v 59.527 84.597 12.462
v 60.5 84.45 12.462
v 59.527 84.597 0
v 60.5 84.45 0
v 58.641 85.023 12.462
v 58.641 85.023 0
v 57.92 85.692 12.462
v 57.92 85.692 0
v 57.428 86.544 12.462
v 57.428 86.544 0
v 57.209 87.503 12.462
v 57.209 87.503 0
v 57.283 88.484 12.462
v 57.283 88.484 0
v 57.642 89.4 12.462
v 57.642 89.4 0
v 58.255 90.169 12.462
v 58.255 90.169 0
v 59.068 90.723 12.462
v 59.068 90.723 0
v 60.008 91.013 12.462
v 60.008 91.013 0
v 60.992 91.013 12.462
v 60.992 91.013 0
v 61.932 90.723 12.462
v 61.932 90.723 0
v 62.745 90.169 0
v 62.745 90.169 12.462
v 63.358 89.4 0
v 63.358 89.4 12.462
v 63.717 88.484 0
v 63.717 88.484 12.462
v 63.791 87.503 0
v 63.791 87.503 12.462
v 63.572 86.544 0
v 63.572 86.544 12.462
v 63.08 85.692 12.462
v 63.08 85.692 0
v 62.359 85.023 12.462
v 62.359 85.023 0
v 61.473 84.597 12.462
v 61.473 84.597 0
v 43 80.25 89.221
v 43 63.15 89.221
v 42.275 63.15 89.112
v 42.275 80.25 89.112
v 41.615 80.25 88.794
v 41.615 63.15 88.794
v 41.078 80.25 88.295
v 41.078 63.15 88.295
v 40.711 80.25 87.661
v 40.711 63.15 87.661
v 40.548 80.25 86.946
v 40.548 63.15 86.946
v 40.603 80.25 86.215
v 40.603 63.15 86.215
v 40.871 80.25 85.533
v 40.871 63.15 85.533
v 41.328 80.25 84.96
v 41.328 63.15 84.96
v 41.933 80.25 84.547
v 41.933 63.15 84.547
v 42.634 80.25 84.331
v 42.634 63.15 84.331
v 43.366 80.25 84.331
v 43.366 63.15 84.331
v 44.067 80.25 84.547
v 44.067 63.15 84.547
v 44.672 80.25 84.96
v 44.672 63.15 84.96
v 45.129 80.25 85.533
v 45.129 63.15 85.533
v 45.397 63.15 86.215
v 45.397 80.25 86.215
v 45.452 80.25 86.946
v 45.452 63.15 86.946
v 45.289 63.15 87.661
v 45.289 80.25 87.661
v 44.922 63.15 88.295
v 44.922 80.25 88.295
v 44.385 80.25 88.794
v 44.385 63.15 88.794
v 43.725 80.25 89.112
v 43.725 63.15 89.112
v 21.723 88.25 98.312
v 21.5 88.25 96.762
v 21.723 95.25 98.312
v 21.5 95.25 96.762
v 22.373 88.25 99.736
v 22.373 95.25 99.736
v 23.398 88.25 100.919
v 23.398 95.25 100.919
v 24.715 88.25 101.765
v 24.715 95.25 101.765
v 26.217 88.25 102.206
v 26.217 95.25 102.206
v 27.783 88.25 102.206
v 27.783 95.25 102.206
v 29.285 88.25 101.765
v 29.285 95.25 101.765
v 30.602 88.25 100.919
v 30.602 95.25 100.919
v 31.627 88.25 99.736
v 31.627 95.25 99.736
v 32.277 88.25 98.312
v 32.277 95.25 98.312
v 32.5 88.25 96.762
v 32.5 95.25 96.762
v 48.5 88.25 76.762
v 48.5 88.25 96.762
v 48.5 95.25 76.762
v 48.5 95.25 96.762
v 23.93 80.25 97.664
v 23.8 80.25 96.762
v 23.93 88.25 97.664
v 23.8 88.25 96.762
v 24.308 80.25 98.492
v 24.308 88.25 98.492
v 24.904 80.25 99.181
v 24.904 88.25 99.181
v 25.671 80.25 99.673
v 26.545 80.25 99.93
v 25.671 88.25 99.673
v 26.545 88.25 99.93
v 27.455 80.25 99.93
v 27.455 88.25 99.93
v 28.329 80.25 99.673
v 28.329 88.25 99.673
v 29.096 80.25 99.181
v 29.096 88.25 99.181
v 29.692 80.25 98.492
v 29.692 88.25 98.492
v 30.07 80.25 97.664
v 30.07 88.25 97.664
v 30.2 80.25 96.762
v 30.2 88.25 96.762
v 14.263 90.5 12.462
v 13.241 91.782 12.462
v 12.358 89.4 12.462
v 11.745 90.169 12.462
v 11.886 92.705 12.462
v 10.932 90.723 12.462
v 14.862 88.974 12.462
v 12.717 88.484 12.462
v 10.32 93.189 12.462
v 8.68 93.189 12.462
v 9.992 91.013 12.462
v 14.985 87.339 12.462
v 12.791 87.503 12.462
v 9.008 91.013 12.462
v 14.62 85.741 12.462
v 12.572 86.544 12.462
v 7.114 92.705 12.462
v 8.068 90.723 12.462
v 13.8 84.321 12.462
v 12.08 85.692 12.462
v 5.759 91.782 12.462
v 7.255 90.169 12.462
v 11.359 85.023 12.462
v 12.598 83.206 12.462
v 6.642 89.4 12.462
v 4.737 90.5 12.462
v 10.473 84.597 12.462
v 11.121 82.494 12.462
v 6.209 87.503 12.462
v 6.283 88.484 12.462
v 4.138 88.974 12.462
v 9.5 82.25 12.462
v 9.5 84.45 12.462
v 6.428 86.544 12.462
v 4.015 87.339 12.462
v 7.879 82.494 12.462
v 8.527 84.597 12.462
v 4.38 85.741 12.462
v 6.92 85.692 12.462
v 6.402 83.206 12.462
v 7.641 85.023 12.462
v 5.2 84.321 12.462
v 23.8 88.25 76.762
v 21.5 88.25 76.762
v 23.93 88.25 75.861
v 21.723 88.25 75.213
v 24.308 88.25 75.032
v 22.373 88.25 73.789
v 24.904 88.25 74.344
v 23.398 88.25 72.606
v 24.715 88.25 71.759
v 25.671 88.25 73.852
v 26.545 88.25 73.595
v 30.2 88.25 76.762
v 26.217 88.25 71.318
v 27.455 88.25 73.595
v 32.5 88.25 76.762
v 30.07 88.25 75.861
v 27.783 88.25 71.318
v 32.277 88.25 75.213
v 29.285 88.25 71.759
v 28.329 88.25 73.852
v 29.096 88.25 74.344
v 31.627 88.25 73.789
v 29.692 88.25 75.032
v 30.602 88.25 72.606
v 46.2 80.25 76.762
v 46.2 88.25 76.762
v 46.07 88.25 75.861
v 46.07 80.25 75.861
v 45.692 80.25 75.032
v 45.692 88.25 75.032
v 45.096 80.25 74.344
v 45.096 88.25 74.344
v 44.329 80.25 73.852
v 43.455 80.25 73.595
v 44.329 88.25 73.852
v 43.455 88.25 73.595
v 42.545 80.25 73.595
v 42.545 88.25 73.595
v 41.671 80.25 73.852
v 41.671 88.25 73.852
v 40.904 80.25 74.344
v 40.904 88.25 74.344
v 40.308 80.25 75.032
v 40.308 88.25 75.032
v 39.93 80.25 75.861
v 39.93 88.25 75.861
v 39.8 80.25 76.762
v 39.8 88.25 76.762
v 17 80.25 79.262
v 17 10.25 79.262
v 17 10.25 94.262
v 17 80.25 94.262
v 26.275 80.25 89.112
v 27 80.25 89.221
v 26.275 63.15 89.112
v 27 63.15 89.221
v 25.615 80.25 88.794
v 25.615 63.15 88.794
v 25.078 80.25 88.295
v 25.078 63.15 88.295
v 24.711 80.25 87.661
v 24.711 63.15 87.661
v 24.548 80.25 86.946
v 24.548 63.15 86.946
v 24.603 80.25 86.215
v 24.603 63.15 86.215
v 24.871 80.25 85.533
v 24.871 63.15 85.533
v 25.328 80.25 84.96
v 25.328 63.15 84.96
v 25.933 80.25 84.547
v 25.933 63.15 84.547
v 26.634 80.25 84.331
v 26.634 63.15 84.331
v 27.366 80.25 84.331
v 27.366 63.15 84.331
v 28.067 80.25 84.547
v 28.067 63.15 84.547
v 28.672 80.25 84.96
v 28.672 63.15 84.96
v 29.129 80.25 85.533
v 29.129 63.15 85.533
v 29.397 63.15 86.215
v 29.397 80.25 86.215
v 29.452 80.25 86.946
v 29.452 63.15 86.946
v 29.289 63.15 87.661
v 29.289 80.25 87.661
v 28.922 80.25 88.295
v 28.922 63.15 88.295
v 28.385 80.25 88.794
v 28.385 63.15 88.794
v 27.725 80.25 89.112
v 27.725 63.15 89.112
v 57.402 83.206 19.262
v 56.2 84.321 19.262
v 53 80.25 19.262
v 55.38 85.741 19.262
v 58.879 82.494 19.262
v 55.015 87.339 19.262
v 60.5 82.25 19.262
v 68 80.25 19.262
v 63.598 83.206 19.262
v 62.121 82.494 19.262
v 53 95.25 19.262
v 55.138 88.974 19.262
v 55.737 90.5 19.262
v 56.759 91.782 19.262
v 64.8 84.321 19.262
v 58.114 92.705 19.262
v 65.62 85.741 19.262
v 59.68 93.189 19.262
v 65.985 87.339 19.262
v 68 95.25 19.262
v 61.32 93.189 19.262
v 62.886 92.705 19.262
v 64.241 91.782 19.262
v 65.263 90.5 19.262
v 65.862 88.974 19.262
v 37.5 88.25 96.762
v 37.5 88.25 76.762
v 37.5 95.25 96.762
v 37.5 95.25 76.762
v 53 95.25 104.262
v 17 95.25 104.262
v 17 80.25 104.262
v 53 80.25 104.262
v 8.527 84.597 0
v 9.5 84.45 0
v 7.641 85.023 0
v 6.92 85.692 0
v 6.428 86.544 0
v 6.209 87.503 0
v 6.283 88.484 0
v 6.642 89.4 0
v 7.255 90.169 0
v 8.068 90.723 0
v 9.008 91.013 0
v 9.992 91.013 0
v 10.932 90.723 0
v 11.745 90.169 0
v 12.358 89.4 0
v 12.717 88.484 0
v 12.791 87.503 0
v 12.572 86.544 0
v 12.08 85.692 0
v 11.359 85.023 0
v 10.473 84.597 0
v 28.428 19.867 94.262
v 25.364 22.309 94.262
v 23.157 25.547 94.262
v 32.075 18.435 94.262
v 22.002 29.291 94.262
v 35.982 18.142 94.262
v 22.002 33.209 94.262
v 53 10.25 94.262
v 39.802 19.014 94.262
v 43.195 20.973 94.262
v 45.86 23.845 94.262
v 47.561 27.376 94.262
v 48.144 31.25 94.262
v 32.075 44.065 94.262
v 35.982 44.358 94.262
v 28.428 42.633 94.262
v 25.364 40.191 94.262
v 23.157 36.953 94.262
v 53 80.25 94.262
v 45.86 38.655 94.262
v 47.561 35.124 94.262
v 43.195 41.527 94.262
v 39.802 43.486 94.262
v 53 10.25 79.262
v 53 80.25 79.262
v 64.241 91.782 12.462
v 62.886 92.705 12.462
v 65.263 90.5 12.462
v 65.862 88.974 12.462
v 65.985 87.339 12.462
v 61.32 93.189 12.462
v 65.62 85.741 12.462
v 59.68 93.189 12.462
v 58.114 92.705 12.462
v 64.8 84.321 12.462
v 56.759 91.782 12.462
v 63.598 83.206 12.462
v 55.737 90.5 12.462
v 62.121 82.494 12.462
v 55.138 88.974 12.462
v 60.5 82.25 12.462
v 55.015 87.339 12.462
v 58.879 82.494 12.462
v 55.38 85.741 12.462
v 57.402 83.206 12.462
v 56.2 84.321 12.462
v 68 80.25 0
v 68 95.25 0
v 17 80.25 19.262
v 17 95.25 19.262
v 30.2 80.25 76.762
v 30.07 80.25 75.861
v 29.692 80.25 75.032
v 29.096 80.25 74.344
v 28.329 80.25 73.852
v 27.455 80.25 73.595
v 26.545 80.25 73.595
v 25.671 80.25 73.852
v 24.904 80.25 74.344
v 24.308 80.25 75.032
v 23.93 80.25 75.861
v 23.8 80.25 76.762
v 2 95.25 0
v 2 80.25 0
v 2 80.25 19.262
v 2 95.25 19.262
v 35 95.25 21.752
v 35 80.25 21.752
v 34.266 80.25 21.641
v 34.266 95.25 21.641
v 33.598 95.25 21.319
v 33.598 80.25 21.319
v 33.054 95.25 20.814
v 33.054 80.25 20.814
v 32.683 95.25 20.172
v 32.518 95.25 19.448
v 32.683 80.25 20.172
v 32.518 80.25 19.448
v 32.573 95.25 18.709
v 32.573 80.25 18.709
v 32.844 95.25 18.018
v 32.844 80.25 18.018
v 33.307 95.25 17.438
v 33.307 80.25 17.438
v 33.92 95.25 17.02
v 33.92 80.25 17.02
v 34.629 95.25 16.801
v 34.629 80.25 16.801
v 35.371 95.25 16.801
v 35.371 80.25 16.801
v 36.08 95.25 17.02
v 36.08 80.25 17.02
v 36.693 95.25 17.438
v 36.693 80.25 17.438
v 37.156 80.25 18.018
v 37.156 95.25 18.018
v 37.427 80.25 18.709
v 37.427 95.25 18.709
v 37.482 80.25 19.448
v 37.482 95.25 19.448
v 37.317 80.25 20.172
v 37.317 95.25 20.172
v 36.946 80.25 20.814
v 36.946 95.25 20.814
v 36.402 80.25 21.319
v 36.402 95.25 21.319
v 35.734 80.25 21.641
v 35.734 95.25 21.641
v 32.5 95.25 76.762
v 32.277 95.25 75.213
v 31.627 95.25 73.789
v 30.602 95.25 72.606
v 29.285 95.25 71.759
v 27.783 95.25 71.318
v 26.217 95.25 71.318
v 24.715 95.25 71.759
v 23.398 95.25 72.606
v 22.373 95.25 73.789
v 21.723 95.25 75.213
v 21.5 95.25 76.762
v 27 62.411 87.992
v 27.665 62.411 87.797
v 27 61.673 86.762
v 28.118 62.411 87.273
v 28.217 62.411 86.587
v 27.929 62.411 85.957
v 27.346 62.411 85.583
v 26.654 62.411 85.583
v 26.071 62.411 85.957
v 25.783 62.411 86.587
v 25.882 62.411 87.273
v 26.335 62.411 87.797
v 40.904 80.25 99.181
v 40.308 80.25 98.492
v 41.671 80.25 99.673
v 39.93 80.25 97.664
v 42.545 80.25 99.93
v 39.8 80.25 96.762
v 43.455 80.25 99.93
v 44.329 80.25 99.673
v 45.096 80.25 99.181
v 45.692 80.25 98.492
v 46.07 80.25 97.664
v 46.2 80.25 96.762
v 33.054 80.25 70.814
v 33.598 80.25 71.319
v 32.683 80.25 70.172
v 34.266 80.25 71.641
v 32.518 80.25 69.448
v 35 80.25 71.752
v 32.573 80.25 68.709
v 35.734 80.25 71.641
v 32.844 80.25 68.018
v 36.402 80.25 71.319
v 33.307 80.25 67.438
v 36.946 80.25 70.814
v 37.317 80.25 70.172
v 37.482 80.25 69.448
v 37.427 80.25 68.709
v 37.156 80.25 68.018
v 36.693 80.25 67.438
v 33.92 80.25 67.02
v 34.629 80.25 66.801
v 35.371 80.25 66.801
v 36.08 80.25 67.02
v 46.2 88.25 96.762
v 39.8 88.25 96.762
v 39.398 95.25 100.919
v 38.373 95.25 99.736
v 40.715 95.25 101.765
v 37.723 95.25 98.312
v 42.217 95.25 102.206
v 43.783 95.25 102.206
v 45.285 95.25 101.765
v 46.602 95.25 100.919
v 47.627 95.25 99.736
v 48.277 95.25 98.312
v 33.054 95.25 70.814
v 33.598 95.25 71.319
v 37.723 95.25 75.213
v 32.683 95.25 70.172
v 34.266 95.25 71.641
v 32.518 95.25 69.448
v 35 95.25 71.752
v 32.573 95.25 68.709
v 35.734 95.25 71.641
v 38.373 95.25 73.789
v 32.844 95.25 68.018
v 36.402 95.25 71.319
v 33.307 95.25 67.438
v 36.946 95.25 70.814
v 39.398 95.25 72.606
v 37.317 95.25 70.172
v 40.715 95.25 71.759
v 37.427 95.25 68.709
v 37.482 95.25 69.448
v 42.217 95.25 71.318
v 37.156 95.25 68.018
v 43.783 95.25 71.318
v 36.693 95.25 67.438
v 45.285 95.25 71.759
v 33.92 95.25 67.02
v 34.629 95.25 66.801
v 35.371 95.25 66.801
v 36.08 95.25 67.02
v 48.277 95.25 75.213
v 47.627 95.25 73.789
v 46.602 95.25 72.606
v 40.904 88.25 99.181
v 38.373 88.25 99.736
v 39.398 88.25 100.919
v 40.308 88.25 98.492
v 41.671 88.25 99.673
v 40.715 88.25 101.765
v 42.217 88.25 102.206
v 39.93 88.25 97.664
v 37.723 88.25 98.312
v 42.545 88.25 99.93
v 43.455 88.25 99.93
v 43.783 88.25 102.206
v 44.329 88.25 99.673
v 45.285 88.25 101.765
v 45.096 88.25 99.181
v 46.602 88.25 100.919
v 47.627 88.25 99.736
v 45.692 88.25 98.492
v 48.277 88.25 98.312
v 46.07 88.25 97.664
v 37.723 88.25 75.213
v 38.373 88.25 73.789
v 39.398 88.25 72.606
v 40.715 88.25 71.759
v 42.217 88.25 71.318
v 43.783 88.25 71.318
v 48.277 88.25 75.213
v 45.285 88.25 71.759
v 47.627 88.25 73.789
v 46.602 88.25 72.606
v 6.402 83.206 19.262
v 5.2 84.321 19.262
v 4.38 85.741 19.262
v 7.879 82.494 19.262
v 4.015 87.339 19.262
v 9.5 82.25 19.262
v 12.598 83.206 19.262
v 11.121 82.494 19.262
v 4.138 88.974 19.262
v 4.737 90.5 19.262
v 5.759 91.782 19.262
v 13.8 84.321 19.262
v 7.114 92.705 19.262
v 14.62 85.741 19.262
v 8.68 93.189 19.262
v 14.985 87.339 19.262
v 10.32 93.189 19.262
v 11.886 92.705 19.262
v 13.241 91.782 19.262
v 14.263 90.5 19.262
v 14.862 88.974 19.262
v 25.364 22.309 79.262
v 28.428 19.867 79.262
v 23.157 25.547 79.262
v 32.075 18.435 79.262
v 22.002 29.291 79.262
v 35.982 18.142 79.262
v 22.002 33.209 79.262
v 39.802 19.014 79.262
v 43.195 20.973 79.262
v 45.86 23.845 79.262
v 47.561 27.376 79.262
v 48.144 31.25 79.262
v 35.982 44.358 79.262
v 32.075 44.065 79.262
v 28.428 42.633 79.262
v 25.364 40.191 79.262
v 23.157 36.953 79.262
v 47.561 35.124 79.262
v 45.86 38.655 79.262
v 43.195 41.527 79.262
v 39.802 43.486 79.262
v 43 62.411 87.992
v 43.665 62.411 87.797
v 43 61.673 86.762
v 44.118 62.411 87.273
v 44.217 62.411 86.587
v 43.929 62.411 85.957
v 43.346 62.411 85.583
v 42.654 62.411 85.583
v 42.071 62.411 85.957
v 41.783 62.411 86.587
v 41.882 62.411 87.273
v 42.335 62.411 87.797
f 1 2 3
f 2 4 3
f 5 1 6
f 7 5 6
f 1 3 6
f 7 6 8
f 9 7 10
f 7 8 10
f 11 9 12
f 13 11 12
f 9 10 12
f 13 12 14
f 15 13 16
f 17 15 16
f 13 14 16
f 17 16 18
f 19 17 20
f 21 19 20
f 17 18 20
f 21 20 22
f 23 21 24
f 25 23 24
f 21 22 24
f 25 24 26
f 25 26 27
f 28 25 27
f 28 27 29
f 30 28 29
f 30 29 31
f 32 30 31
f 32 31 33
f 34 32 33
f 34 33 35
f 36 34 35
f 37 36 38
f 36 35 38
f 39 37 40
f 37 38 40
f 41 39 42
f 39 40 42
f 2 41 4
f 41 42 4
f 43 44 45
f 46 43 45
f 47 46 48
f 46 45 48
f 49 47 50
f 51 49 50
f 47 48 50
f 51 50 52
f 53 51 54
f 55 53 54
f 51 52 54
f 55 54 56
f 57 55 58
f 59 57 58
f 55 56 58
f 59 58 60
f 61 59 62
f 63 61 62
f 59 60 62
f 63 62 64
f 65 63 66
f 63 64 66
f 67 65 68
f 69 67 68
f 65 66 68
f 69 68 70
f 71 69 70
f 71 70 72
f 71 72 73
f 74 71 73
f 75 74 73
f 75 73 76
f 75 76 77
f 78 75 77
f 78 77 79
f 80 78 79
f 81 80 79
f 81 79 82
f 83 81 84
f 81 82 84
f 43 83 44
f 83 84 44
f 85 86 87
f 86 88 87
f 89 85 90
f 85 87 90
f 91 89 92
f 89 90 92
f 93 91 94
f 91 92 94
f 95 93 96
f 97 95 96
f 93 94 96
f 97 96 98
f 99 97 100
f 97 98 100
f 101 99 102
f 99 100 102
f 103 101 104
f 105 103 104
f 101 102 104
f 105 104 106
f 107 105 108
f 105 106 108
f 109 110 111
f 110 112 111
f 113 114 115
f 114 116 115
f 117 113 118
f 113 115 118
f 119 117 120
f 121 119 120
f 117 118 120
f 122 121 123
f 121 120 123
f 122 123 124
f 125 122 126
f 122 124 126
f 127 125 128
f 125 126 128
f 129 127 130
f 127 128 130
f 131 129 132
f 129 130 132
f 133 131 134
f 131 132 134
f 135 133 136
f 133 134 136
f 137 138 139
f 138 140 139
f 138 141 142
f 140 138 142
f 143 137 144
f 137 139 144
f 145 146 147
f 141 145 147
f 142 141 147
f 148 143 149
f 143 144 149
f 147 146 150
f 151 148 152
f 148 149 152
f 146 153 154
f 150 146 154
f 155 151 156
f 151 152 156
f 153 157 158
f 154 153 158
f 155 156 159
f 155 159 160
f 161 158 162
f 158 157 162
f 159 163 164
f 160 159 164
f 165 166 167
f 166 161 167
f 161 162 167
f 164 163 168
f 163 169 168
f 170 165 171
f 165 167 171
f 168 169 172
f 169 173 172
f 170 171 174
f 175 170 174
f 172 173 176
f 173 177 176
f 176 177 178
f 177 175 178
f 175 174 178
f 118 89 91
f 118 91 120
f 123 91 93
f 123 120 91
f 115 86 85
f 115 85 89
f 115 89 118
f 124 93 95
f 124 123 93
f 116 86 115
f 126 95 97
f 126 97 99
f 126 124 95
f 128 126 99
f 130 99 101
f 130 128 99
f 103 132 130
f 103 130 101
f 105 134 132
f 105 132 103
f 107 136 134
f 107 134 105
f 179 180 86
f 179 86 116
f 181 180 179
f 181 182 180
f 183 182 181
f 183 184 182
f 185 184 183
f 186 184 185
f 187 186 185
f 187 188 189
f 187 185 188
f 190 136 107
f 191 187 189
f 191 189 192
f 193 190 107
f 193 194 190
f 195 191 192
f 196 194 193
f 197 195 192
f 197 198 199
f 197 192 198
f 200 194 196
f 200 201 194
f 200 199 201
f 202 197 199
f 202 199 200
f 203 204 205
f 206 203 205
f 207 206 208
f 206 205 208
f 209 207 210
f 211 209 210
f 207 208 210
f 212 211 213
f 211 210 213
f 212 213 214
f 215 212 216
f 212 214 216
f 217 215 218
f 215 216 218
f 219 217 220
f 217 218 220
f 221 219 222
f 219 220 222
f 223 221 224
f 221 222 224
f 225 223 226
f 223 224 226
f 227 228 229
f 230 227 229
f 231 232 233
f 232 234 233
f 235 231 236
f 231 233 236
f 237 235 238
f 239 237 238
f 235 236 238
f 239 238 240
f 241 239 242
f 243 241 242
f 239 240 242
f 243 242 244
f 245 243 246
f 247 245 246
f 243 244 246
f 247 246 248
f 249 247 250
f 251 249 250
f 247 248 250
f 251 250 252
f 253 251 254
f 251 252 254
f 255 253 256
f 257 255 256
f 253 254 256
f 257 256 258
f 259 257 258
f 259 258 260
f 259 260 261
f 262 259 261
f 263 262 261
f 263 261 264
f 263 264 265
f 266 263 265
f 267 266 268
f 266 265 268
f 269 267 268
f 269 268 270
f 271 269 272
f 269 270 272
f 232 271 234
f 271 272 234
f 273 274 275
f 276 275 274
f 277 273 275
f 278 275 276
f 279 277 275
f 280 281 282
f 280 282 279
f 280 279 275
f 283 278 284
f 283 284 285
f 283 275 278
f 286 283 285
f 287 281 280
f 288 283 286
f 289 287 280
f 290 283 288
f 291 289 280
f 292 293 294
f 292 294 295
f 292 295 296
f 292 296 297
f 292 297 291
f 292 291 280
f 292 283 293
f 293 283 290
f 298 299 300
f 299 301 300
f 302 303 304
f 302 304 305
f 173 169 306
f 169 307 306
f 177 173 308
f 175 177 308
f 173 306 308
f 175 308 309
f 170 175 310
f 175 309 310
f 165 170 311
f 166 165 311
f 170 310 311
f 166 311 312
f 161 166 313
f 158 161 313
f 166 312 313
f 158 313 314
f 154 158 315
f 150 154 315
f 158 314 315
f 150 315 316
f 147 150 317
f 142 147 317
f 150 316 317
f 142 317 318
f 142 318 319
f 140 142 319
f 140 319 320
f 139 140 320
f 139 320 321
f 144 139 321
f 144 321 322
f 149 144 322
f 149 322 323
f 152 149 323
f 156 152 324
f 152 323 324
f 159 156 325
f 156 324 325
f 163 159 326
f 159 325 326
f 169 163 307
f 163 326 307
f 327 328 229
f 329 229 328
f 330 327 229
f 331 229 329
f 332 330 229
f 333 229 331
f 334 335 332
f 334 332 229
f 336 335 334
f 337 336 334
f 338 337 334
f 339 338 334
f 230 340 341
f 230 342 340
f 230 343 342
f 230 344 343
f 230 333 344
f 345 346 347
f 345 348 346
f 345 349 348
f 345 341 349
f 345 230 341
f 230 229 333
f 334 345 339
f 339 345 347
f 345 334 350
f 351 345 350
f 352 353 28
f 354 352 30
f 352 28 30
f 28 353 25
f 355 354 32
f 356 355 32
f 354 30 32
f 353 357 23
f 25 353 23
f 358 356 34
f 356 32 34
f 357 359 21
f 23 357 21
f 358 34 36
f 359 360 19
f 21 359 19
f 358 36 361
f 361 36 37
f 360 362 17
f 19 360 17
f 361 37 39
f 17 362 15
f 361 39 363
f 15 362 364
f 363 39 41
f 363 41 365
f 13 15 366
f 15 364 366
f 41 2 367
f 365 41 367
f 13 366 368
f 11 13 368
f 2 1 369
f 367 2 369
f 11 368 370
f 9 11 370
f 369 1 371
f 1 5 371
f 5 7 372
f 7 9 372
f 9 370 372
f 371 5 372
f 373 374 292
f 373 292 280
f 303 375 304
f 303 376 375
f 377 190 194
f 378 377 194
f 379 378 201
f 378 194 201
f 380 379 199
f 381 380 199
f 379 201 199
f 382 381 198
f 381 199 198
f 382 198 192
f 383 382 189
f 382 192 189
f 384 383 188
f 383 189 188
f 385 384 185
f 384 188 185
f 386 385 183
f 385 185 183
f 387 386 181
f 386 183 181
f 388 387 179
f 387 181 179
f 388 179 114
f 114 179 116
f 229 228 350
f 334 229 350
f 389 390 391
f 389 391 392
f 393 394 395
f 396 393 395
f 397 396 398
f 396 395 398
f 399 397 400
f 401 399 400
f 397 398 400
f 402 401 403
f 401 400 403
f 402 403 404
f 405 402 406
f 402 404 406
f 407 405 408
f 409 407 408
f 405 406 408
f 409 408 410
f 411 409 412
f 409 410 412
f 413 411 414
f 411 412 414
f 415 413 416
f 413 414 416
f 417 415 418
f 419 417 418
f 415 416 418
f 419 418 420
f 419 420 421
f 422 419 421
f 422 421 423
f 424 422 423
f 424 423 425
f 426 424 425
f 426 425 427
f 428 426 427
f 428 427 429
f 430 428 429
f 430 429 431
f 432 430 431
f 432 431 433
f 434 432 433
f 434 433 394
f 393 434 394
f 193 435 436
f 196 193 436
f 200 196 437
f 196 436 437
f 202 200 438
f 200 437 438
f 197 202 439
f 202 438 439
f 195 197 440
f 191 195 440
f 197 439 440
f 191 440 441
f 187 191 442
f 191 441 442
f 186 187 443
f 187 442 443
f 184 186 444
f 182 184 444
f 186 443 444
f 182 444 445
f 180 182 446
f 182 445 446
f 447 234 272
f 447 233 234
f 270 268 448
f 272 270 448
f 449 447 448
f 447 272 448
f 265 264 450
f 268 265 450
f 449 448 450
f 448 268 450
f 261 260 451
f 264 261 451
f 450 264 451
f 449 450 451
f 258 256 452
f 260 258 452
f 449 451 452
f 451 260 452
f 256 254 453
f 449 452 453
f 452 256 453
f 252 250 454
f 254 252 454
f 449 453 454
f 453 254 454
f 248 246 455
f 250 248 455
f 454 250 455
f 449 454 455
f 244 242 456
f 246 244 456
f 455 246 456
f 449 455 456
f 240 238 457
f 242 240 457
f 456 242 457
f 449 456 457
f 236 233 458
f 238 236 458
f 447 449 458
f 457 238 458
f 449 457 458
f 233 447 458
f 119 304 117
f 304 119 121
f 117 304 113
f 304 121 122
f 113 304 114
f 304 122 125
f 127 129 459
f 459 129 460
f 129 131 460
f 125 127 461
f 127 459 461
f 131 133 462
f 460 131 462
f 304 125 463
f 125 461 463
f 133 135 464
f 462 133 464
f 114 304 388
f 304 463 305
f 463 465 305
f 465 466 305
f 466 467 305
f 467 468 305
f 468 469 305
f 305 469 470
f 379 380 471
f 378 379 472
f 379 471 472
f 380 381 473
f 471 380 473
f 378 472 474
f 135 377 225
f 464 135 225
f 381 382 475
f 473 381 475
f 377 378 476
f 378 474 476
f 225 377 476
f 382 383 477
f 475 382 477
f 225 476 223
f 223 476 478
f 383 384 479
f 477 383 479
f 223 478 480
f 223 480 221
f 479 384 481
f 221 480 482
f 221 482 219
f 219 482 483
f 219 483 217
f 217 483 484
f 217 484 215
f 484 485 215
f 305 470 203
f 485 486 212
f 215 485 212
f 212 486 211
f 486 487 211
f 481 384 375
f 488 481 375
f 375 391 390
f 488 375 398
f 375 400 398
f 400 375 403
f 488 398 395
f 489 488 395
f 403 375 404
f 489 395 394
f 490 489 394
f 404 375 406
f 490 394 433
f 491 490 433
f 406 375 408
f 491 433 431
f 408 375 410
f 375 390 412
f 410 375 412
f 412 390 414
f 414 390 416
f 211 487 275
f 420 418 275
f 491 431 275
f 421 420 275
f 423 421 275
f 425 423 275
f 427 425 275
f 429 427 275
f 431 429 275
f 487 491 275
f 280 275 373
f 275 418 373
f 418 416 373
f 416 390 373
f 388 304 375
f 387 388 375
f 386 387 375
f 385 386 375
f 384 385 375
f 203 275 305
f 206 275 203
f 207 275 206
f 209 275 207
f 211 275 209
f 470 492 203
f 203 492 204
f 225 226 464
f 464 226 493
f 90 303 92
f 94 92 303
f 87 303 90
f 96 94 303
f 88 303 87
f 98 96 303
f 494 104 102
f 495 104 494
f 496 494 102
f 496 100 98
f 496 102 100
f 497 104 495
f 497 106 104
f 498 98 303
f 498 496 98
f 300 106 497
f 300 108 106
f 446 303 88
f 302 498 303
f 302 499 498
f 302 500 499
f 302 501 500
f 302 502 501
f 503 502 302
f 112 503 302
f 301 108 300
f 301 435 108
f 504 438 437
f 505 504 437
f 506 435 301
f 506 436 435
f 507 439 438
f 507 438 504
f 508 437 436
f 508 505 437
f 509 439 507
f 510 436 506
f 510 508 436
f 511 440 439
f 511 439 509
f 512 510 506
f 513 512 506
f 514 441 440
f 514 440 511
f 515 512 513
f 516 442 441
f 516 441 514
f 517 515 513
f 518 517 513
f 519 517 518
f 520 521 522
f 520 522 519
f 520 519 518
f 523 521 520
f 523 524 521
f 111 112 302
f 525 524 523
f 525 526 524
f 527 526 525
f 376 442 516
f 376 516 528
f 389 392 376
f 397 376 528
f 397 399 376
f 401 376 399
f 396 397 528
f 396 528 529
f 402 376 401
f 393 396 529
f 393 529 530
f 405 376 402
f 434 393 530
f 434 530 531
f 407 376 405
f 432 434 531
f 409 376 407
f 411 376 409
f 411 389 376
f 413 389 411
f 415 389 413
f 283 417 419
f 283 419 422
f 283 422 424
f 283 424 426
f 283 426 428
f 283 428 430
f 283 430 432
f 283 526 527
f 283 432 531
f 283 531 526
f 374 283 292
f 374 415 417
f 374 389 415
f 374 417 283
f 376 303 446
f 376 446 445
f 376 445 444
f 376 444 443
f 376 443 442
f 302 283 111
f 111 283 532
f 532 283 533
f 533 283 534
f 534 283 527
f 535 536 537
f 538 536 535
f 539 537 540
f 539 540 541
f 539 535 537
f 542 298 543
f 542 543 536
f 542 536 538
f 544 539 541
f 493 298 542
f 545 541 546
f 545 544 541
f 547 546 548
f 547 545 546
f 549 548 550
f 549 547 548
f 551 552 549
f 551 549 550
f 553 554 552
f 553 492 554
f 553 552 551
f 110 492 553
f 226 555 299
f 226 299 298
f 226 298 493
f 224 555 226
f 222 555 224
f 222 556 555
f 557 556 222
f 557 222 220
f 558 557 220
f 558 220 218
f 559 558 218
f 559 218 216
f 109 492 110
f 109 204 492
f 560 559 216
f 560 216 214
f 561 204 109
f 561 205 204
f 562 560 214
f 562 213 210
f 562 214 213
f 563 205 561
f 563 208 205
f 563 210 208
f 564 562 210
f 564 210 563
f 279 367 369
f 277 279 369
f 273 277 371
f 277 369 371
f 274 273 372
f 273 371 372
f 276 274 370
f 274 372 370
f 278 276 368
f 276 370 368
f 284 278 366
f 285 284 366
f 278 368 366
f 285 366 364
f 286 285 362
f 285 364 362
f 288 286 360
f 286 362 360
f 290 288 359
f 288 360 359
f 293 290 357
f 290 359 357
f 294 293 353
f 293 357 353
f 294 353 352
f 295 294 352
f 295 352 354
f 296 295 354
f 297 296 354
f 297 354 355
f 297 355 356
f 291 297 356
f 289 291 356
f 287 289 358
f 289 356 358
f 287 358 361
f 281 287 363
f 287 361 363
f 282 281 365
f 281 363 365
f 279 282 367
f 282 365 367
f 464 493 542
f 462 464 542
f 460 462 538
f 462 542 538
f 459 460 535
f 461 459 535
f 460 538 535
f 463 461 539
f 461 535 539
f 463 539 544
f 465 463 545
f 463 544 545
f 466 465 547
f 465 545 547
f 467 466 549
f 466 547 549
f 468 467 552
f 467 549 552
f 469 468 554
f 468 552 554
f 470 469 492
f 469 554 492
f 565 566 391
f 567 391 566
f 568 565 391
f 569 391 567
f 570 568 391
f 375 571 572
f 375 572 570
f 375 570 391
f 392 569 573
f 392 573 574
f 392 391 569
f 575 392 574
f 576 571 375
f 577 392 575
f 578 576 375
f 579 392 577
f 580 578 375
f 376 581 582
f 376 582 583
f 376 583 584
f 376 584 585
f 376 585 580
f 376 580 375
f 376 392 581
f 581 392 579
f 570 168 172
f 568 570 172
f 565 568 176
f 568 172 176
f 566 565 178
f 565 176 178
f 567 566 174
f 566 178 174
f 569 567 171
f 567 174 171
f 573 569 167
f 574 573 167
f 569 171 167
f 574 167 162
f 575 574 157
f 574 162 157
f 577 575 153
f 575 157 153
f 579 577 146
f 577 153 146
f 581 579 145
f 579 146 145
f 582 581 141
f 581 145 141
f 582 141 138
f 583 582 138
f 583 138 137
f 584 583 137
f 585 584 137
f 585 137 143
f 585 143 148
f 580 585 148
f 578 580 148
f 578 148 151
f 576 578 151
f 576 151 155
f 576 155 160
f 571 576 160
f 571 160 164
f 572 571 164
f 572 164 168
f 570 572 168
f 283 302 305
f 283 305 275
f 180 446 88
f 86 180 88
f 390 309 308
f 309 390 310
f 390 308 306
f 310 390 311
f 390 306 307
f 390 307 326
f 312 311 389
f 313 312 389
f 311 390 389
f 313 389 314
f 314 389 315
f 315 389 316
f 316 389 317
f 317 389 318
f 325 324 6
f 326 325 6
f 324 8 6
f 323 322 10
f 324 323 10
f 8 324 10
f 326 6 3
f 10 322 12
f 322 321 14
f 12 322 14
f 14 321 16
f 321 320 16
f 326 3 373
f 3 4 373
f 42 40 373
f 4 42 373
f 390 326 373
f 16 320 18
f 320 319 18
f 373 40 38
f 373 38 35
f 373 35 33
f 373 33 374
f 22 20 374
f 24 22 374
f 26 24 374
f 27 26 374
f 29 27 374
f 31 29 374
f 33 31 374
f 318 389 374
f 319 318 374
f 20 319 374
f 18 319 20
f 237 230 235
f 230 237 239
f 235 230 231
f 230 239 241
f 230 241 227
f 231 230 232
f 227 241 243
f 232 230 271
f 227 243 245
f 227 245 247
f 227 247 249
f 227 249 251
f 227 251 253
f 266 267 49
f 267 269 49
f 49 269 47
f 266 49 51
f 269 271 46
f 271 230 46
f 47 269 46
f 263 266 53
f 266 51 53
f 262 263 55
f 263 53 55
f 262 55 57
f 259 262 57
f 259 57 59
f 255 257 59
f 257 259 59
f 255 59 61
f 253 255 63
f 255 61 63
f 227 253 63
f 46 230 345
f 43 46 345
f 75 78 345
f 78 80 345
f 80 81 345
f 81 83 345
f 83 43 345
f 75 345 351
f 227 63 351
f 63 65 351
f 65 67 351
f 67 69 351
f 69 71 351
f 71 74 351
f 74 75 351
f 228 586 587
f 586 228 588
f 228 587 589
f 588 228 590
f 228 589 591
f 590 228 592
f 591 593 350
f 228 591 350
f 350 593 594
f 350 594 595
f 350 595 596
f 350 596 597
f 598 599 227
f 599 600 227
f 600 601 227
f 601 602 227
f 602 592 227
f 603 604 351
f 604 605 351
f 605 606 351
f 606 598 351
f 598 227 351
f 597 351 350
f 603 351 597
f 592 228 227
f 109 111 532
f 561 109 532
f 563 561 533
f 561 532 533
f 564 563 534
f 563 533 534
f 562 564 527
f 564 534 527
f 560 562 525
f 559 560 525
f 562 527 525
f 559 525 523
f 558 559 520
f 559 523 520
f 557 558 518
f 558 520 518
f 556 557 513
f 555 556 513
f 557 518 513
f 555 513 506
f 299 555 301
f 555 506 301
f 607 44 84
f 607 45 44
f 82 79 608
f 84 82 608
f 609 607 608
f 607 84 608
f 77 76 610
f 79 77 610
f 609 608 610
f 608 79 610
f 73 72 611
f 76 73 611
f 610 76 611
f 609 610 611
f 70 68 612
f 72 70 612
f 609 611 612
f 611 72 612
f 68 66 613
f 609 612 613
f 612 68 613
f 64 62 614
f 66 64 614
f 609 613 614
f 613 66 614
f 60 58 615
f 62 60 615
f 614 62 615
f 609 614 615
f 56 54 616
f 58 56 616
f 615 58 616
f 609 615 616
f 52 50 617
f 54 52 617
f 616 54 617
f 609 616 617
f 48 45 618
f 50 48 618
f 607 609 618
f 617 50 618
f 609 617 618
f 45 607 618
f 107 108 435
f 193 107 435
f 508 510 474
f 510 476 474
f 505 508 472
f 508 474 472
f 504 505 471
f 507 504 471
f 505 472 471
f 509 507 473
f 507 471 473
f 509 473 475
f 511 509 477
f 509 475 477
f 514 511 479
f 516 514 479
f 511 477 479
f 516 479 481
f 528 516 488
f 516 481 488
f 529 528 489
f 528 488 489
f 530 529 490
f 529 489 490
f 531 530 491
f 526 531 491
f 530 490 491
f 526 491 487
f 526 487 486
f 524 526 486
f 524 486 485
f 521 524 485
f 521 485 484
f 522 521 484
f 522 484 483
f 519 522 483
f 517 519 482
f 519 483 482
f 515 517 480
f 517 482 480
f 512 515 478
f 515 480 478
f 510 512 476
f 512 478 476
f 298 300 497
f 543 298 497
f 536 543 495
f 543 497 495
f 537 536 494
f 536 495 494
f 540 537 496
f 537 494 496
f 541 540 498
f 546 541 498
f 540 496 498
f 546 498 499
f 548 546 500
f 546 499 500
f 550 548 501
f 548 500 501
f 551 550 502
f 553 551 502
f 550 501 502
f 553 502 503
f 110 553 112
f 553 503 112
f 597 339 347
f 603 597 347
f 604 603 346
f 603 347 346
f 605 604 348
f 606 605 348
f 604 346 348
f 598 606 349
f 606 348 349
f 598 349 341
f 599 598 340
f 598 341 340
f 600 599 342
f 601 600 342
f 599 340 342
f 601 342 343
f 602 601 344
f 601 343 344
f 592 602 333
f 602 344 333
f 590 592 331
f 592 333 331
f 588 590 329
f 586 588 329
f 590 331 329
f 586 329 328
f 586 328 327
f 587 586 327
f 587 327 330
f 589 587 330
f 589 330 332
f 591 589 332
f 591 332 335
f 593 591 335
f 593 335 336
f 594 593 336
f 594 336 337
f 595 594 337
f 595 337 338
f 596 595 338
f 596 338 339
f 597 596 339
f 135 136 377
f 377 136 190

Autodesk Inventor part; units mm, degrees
ref_plane "YZ Plane" through (0, 0, 0) normal (1, 0, 0) x (0, 1, 0)
ref_plane "XZ Plane" through (0, 0, 0) normal (0, 1, 0) x (-1, 0, 0)
ref_plane "Work Plane1" through (0, 0, 0) normal (0, 0, 1) x (1, 0, 0)
sketch "Sketch1" plane through (0, 0, 0) normal (0, 0, 1) x (1, 0, 0)
  line L0 (2, 95.25) -> (68, 95.25)
  line L1 (2, 80.25) -> (68, 80.25)
  line L2 (2, 0) -> (2, 95.25)
  line L3 (68, 95.25) -> (68, 0)
  point P0 (0, 0)
ref_plane "Work Plane2" through (12.0686, 8.3392, 79.2624) normal (0, 0, 1) x (1, 0, 0)
extrude "Extrusion1" add sketch "Sketch1" along normal up to surface (79.2624 mm away)
sketch "Sketch2" plane through (2, 95.25, 79.2624) normal (0, 0, 1) x (1, 0, 0)
  line L0 (66, -15) -> (66, 0) projected
  line L1 (66, 0) -> (0, 0) projected
  line L2 (66, -15) -> (51, -15)
  line L3 (51, -15) -> (51, 0)
  line L4 (51, 0) -> (66, 0)
  line L5 (66, 0) -> (66, -15)
  line L6 (0, 0) -> (0, -15) projected
  line L7 (0, -15) -> (15, -15)
  line L8 (15, -15) -> (15, 0)
  line L9 (15, 0) -> (0, 0)
  line L10 (0, 0) -> (0, -15)
  point P0 (-2, -95.25)
  dimension "d2" = 15
  dimension "d3" = 15
extrude "Extrusion2" cut sketch "Sketch2" against normal blind 60
sketch "Sketch4" plane through (2, 95.25, 19.2624) normal (0, 0, 1) x (1, 0, 0)
  line L0 (66, -15) -> (51, -15) projected
  line L1 (66, 0) -> (66, -15) projected
  line L2 (51, 0) -> (66, 0) projected
  line L3 (51, -15) -> (51, 0) projected
  line L4 (15, -15) -> (0, -15) projected
  line L5 (0, -15) -> (0, 0) projected
  line L6 (15, 0) -> (15, -15) projected
  line L7 (0, 0) -> (15, 0) projected
  point P0 (-2, -95.25)
  point P1 (58.5, -7.5)
  point P2 (7.5, -7.5)
hole "Hole1" at (60.5, 87.75, 19.2624) at (9.5, 87.75, 19.2624) direction (0, 0, -1) diameter 6.6 end through all counterbore diameter 11 counterbore depth 6.8 clearance for "Socket Head Cap Screw ISO 4762" size "M6" standard "ISO"
sketch "Sketch5" plane through (2, 95.25, 0) normal (0, 1, 0) x (1, 0, 0)
  line L0 (51, -79.2624) -> (51, -19.2624) projected
  line L1 (15, -19.2624) -> (15, -79.2624) projected
  line L2 (15, -79.2624) -> (51, -79.2624) projected
  line L3 (51, -79.2624) -> (15, -79.2624)
  line L4 (15, -79.2624) -> (15, -94.2624)
  line L5 (15, -94.2624) -> (51, -94.2624)
  line L6 (51, -94.2624) -> (51, -79.2624)
  point P0 (-2, 0)
  dimension "d13" = 15
extrude "Extrusion3" add sketch "Sketch5" against normal blind 85
sketch "Sketch6" plane through (17, 95.25, 94.2624) normal (0, 0, 1) x (1, 0, 0)
  circle A0 centre (18, -64) radius 25
  circle A1 centre (18, -64) radius 13.1445
  point P0 (-17, -95.25)
  dimension "d16" = 26.289
extrude "Extrusion4" cut sketch "Sketch6" against normal up to surface (15 mm away) contours A1
sketch "Sketch7" plane through (2, 95.25, 0) normal (0, 1, 0) x (1, 0, 0)
  line L0 (66, 0) -> (0, 0) projected
  line L1 (51, -94.2624) -> (51, -19.2624) projected
  line L2 (15, -19.2624) -> (15, -94.2624) projected
  line L3 (15, -94.2624) -> (51, -94.2624) projected
  line L4 (51, -94.2624) -> (51, -19.2624) projected
  line L5 (51, -19.2624) -> (66, -19.2624) projected
  line L6 (66, 0) -> (66, -19.2624) projected
  line L7 (66, 0) -> (0, 0) projected
  line L8 (0, 0) -> (0, -19.2624) projected
  line L9 (0, -19.2624) -> (15, -19.2624) projected
  point P0 (-2, 0)
  point P1 (33, -19.2624)
  point P2 (33, -69.2624)
  dimension "d19" = 50
hole "Hole2" at (35, 95.25, 19.2624) at (35, 95.25, 69.2624) direction (0, -1, 0) diameter 4.9784 depth 19.05 tip angle 118 thread size "1/4-20 UNC" class "2B" standard "ANSI Unified Screw Threads"
ref_plane "Work Plane3" through (2, 80.25, 0) normal (0, -1, 0) x (1, 0, 0)
split body "Split1" result two bodies by plane through (2, 80.25, 0) normal (0, -1, 0) first body at (35.5281, 68.2662, 93.7624)
sketch "Sketch8" plane through (17, 95.25, 94.2624) normal (0, 0, 1) x (1, 0, 0)
  line L0 (0, -15) -> (36, -15) projected
  line L1 (36, 0) -> (36, -15) projected
  line L2 (0, 0) -> (36, 0) projected
  line L3 (0, 0) -> (0, -15) projected
  point P0 (-17, -95.25)
extrude "Extrusion5" add sketch "Sketch8" along normal blind 10 bodies 3
sketch "Sketch10" plane through (17, 80.25, 94.2624) normal (0, 1, 0) x (1, 0, 0)
  line L0 (0, 0) -> (36, 0) projected
  line L1 (36, 0) -> (36, 15) projected
  line L2 (36, 15) -> (0, 15) projected
  line L3 (0, 15) -> (0, 0) projected
  point P0 (-17, 94.2624)
  point P1 (10, 7.5)
  point P2 (26, 7.5)
  point P3 (36, 7.5)
  dimension "d30" = 10
  dimension "d31" = 10
hole "Hole3" at (27, 80.25, 86.7624) at (43, 80.25, 86.7624) direction (0, -1, 0) diameter 4.917 depth 17.1 tip angle 118 bodies 2 thread size "M6x1" class "6H" standard "ISO Metric profile"
sketch "Sketch11" plane through (2, 95.25, 0) normal (0, 1, 0) x (1, 0, 0)
  circle A0 centre (41, -86.7624) radius 2.4585 projected
  circle A1 centre (25, -86.7624) radius 2.4585 projected
  line L0 (41, -96.7624) -> (41, -76.7624) construction
  line L1 (46.5, -96.7624) -> (46.5, -76.7624)
  line L2 (35.5, -76.7624) -> (35.5, -96.7624)
  arc A2 (35.5, -96.7624) -> (46.5, -96.7624) centre (41, -96.7624) ccw
  arc A3 (46.5, -76.7624) -> (35.5, -76.7624) centre (41, -76.7624) ccw
  line L3 (25, -96.7624) -> (25, -76.7624) construction
  line L4 (30.5, -96.7624) -> (30.5, -76.7624)
  line L5 (19.5, -76.7624) -> (19.5, -96.7624)
  arc A4 (19.5, -96.7624) -> (30.5, -96.7624) centre (25, -96.7624) ccw
  arc A5 (30.5, -76.7624) -> (19.5, -76.7624) centre (25, -76.7624) ccw
  line L6 (41, -96.7624) -> (41, -76.7624) construction
  line L7 (44.2, -96.7624) -> (44.2, -76.7624)
  line L8 (37.8, -76.7624) -> (37.8, -96.7624)
  arc A6 (37.8, -96.7624) -> (44.2, -96.7624) centre (41, -96.7624) ccw
  arc A7 (44.2, -76.7624) -> (37.8, -76.7624) centre (41, -76.7624) ccw
  line L9 (25, -96.7624) -> (25, -76.7624) construction
  line L10 (28.2, -96.7624) -> (28.2, -76.7624)
  line L11 (21.8, -76.7624) -> (21.8, -96.7624)
  arc A8 (21.8, -96.7624) -> (28.2, -96.7624) centre (25, -96.7624) ccw
  arc A9 (28.2, -76.7624) -> (21.8, -76.7624) centre (25, -76.7624) ccw
  point P0 (-2, 0)
  dimension "d39" = 10
  dimension "d40" = 11
  dimension "d41" = 10
  dimension "d42" = 11
  dimension "d43" = 6.4
  dimension "d44" = 6.4
extrude "Extrusion6" cut sketch "Sketch11" against normal up to surface (15 mm away) contours A0 | A1 | A6 L8 A7 L7 | A8 L11 A9 L10 bodies 3
extrude "Extrusion7" cut sketch "Sketch11" against normal blind 7 contours A0 | A1 | A2 L2 A3 L1 | A4 L5 A5 L4 | A6 L8 A7 L7 | A8 L11 A9 L10 bodies 3
properties part number "AdapterBracket"
